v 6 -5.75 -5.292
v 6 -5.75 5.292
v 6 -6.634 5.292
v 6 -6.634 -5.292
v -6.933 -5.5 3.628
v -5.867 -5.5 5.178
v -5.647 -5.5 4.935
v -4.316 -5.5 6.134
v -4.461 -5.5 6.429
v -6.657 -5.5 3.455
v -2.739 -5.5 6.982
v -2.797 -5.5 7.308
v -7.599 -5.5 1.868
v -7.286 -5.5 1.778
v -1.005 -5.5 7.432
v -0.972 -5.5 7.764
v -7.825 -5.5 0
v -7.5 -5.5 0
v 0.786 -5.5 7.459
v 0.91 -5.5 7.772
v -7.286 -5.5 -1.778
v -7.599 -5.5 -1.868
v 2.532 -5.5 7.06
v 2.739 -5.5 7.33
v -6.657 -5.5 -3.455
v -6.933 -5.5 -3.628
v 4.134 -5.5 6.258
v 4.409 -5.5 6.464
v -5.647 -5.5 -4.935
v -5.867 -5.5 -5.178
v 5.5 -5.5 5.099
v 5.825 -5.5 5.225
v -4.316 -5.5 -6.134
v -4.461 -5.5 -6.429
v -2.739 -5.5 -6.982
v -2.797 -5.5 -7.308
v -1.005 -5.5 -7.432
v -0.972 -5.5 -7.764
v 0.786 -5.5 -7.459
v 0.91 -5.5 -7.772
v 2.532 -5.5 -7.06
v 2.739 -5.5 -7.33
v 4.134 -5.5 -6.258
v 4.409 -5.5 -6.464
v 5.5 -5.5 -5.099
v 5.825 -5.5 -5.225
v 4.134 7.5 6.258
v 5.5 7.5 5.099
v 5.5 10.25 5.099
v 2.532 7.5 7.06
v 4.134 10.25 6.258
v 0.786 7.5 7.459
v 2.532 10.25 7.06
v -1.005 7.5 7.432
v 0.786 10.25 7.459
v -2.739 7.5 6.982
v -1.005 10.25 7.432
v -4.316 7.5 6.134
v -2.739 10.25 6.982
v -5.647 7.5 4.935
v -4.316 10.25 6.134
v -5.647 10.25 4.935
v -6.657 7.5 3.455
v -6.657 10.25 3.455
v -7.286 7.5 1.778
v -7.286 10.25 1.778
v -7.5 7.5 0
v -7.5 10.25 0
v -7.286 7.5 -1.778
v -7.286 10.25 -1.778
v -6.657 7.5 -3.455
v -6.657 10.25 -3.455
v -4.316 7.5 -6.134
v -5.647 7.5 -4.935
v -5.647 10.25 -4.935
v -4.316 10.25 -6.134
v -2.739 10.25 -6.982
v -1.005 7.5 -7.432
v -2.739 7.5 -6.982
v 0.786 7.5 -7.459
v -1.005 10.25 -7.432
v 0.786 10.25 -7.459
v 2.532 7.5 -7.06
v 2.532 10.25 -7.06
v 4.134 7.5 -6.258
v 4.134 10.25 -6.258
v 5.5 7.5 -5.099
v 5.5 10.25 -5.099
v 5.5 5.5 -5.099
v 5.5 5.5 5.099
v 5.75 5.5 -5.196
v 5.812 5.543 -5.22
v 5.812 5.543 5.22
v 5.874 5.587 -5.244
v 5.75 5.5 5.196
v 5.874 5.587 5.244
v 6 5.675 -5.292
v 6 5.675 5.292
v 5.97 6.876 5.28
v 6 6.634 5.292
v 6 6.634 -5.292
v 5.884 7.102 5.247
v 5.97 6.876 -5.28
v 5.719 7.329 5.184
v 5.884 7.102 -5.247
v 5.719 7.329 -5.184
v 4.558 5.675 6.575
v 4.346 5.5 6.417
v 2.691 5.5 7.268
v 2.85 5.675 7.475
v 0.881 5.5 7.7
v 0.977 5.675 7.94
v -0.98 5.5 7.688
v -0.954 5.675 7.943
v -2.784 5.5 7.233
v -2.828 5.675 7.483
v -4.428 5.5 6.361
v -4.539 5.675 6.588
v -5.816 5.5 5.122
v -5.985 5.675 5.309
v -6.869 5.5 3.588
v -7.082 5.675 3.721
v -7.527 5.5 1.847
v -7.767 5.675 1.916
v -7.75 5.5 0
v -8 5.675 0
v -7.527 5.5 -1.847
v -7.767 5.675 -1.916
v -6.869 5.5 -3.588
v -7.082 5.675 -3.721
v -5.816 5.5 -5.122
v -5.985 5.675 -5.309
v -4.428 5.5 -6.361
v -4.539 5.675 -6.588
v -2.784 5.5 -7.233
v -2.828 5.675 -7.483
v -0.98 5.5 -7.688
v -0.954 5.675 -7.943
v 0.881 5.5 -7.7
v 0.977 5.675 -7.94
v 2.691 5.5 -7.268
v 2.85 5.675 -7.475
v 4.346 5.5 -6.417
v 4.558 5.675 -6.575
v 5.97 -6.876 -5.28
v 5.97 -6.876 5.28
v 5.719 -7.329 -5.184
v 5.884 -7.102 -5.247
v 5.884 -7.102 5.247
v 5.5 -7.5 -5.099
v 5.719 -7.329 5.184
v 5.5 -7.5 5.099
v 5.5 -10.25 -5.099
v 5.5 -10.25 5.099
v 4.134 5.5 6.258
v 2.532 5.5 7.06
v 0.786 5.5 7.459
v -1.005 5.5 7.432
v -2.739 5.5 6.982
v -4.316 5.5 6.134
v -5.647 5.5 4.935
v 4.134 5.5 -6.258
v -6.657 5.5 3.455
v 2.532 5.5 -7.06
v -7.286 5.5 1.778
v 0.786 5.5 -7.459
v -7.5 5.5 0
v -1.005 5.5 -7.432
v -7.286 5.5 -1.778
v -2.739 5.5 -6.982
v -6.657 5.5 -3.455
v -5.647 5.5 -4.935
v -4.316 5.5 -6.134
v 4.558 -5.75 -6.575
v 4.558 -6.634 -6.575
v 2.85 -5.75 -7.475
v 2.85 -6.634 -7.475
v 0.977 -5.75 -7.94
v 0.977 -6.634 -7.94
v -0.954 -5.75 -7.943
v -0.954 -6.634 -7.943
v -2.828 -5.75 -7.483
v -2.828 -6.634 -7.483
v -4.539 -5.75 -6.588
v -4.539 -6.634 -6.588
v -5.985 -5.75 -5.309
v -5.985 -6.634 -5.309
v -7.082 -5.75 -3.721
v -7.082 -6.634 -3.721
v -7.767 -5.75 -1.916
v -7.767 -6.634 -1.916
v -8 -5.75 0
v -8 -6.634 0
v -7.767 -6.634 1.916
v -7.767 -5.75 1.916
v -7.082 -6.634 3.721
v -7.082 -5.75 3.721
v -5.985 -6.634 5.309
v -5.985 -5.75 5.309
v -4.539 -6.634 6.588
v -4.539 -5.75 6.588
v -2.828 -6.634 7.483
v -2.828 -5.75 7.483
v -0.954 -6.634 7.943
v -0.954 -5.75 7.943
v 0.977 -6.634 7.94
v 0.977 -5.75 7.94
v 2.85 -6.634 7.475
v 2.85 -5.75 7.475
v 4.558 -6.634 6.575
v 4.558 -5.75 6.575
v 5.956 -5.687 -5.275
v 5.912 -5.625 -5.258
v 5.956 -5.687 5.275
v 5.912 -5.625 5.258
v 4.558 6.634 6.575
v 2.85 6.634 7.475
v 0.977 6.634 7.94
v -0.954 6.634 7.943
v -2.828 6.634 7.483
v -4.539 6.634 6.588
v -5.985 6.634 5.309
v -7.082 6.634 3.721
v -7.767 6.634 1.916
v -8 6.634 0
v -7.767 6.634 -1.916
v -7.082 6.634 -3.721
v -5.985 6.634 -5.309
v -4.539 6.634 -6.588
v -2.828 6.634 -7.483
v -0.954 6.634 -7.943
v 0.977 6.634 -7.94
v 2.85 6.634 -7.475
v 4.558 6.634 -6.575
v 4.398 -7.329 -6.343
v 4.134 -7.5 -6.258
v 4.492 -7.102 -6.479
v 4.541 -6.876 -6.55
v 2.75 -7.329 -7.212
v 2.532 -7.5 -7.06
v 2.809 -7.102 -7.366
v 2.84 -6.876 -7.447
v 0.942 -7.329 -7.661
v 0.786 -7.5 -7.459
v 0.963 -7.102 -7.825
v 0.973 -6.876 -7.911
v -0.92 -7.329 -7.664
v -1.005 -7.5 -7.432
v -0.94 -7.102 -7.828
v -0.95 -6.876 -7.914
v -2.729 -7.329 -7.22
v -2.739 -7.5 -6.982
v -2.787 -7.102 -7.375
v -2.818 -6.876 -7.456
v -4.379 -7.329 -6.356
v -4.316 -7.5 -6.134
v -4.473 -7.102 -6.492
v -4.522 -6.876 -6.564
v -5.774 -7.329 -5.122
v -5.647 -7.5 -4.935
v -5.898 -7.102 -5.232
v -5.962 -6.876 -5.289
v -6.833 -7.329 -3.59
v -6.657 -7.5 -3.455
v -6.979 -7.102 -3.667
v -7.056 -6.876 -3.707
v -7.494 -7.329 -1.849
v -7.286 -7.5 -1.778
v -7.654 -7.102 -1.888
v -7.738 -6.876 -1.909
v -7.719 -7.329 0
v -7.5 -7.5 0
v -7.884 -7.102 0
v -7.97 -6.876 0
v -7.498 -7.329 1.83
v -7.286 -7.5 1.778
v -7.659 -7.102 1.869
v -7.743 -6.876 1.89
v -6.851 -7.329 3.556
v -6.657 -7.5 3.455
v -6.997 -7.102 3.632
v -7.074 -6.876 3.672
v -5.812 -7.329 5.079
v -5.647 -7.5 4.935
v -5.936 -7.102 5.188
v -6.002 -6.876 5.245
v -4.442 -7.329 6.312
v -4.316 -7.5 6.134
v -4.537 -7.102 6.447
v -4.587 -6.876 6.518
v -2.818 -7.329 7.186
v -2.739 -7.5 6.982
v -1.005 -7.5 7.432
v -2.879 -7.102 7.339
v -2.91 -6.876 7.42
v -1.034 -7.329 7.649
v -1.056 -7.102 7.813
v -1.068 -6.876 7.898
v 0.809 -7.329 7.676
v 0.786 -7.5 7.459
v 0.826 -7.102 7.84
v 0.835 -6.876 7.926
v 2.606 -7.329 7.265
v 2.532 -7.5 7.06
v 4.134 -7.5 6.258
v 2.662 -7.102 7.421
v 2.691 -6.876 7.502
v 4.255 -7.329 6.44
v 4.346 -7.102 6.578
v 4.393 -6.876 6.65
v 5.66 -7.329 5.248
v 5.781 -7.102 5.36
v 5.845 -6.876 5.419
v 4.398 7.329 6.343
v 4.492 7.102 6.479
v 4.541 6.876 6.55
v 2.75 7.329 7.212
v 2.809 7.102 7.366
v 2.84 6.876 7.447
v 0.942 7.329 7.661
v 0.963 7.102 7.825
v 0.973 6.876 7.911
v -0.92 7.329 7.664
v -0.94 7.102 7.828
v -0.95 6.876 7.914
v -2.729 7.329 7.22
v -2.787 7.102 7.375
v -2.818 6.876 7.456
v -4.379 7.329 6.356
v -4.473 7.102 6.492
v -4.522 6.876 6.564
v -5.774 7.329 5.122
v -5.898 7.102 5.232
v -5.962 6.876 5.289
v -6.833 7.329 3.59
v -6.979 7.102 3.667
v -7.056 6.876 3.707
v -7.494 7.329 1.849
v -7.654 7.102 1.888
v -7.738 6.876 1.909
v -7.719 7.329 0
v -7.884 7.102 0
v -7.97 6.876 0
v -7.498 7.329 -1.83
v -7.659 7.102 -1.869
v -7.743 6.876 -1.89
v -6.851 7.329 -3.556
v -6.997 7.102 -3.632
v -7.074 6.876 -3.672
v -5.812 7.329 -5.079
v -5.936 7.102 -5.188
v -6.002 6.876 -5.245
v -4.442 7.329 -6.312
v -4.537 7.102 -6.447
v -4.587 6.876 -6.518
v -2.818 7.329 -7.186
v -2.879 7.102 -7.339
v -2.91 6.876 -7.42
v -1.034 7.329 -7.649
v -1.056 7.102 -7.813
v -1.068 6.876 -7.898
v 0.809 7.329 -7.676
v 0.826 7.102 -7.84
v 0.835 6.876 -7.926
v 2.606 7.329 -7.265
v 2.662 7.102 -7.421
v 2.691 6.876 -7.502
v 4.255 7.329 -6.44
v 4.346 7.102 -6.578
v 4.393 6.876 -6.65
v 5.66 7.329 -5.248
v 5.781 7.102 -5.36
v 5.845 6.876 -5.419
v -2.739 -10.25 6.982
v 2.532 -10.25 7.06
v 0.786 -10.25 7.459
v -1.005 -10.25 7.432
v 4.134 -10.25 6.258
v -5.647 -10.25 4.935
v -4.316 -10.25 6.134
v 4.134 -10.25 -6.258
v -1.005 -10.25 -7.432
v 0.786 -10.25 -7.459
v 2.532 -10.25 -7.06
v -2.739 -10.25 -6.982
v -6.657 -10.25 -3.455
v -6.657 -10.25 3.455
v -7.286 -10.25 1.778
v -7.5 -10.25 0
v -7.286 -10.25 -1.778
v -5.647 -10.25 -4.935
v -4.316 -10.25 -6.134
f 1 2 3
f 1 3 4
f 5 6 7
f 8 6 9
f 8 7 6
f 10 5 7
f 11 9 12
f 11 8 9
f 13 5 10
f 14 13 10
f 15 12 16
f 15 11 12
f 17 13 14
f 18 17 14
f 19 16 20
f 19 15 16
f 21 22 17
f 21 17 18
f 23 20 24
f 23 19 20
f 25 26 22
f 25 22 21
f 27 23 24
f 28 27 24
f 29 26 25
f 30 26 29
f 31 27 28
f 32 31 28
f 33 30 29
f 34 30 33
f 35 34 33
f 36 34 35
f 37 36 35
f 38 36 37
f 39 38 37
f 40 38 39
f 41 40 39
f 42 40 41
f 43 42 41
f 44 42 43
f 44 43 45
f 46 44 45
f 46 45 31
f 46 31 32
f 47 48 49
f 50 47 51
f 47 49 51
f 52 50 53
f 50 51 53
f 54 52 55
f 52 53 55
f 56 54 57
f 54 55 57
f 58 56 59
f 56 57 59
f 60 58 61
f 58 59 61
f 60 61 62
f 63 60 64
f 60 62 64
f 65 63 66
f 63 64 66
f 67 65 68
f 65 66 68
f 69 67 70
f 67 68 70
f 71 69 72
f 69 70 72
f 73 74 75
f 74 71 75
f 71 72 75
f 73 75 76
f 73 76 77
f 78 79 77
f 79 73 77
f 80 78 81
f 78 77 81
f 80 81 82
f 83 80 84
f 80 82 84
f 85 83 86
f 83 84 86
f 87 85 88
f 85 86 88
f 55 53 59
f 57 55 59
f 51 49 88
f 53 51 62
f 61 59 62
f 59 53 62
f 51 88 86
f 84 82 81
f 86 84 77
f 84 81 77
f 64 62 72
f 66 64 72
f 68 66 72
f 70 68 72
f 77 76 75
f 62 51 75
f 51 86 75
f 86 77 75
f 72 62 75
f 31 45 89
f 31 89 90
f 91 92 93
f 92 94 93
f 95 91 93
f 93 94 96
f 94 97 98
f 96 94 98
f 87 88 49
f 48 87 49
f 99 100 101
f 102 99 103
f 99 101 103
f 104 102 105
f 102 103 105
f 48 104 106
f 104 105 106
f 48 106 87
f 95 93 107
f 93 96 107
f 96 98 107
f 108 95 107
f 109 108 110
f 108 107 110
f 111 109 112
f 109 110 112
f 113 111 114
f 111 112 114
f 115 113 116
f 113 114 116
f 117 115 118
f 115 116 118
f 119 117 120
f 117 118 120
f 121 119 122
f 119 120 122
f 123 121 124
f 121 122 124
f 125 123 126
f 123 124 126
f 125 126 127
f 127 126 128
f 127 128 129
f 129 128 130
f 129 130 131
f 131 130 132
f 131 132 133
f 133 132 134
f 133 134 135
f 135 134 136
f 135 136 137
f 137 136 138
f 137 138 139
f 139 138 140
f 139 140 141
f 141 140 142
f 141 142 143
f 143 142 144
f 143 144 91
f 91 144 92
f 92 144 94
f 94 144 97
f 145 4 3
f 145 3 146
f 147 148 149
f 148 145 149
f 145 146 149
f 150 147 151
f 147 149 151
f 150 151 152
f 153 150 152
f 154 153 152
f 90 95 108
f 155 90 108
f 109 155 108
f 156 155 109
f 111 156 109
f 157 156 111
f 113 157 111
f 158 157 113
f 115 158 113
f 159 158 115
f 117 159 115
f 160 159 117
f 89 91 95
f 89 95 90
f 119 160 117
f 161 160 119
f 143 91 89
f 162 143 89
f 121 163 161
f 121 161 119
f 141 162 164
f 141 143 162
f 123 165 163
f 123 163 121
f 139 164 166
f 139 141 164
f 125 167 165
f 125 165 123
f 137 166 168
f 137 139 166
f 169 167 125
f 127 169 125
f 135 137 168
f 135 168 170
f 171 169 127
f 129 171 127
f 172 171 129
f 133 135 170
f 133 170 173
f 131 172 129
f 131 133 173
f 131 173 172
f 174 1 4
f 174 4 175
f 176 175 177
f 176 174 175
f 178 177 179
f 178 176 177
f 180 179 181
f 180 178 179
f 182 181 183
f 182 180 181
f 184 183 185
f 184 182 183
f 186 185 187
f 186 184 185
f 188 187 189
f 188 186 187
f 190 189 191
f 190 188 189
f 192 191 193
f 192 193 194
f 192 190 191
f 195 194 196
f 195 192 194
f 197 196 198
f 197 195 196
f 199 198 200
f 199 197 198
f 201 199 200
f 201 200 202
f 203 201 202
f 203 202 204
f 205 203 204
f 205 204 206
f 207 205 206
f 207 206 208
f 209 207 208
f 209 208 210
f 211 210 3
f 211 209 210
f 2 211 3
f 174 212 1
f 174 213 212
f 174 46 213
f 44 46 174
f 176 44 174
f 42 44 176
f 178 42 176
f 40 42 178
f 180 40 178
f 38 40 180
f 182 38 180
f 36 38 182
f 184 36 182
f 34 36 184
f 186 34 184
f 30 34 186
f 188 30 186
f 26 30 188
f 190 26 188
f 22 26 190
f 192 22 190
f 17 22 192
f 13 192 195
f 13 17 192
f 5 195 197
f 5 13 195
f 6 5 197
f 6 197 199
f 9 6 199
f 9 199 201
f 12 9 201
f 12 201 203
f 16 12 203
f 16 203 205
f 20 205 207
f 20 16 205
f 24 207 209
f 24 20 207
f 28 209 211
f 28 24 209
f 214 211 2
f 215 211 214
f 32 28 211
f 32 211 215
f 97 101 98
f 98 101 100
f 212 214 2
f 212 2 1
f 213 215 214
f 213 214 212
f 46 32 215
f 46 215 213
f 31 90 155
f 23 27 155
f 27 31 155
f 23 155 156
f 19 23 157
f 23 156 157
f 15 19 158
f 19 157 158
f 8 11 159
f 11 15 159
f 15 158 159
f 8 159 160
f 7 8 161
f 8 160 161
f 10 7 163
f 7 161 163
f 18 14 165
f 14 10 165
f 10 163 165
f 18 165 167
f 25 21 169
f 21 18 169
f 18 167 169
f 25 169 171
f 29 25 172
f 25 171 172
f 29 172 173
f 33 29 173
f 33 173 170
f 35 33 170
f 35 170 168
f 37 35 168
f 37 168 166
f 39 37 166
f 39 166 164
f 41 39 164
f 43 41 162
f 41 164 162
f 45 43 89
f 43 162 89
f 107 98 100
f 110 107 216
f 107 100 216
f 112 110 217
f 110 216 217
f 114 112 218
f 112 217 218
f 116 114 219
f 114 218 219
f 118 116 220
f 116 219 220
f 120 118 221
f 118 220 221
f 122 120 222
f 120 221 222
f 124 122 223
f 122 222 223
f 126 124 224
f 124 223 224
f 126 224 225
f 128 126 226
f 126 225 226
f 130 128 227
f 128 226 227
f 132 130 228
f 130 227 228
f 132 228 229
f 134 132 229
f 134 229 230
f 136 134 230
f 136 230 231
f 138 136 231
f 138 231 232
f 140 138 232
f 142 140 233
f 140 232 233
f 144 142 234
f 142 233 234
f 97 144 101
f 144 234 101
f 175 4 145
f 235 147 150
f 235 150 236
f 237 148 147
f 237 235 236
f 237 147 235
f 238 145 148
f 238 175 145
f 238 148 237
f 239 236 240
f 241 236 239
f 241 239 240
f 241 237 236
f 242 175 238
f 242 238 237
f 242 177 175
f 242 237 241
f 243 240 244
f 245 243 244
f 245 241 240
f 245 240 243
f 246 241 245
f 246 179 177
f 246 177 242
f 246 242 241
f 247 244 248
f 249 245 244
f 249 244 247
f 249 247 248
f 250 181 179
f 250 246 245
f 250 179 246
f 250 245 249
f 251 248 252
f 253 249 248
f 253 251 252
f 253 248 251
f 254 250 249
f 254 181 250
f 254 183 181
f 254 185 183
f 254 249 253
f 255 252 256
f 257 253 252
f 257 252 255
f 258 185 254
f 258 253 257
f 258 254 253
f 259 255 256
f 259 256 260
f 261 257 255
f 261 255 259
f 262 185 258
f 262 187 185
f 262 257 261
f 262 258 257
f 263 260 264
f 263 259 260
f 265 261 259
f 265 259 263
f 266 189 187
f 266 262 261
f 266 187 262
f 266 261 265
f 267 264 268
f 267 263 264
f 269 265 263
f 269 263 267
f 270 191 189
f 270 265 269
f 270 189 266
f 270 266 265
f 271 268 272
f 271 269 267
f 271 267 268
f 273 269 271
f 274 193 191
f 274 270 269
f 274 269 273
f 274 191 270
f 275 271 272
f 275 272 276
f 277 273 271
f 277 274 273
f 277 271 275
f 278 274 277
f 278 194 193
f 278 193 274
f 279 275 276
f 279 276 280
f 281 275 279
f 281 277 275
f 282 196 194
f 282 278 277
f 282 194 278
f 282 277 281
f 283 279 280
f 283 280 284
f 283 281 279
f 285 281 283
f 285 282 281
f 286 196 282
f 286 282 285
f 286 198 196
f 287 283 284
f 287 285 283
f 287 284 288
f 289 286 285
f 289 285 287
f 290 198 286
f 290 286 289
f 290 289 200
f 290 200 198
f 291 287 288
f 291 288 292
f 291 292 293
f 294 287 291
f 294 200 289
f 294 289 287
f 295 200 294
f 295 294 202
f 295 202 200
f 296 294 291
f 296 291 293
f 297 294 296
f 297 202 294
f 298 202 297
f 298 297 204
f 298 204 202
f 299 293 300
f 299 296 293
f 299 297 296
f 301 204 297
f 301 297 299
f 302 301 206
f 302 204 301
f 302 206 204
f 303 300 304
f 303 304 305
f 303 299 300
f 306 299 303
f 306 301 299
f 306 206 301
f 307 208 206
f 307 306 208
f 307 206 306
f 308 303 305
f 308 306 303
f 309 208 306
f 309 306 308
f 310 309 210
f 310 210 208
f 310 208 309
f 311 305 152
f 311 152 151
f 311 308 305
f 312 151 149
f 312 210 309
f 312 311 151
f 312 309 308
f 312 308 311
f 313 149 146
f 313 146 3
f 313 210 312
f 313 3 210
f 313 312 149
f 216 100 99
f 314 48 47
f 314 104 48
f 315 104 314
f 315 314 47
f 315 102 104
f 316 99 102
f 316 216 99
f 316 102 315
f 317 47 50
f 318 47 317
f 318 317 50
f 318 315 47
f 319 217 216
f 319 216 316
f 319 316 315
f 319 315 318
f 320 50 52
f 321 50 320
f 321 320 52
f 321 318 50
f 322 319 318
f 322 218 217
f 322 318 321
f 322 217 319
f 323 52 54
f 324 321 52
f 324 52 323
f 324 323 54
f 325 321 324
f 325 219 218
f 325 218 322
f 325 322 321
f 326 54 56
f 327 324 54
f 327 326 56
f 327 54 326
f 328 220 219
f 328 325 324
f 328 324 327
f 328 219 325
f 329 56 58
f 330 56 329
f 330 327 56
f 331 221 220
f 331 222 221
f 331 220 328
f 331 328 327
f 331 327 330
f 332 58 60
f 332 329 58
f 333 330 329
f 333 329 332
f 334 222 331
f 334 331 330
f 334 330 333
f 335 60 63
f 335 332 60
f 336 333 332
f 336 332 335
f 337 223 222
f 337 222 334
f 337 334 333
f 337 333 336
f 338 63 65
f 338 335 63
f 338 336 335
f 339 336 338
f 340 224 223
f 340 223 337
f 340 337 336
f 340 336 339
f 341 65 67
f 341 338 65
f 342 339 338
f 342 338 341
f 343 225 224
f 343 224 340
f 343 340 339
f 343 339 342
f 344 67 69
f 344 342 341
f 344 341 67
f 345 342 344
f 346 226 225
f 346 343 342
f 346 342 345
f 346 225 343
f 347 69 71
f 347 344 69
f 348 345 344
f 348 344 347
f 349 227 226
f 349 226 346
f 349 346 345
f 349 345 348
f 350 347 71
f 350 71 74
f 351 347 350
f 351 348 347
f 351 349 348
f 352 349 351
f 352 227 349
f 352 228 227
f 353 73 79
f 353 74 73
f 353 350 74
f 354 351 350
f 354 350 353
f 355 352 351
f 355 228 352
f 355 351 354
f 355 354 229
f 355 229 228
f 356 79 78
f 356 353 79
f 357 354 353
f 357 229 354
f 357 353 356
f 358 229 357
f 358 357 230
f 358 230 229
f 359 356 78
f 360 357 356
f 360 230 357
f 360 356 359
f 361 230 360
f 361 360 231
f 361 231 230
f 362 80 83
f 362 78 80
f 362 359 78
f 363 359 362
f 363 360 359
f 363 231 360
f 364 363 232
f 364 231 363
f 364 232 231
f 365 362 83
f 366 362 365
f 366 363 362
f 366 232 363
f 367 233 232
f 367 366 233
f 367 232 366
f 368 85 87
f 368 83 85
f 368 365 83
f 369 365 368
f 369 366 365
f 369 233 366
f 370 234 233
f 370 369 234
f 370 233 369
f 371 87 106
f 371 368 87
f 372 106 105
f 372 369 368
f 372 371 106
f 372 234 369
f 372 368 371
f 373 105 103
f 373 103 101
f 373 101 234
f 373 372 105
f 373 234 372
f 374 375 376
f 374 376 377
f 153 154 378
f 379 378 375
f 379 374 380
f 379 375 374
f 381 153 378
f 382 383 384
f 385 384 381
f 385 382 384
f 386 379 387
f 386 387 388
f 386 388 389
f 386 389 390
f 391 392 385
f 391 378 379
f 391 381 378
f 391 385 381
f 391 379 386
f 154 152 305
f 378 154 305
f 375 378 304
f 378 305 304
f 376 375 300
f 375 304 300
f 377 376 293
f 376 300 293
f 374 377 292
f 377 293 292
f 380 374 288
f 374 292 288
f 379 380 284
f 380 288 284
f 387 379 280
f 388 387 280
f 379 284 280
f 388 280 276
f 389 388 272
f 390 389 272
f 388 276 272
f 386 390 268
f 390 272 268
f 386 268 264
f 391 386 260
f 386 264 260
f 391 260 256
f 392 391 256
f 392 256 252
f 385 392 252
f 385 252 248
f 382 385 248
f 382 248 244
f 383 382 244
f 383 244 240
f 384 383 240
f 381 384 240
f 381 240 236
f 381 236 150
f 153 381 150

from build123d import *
from OCP.BRepFilletAPI import BRepFilletAPI_MakeChamfer

# Parameters (mm, degrees)
BOSS_EXTRUDE1_DEPTH = 10.25
BOSS_EXTRUDE2_DEPTH = 1
BOSS_EXTRUDE3_DEPTH = 1
FILLET1_R           = 1
CHAMFER1_SIZE       = 0.25
CHAMFER1_SIZE2      = 0.175051885


with BuildPart() as part:
    # Sketch1 → Boss-Extrude1 (new, symmetric)
    with BuildSketch(Plane(origin=(0, 0, 0), x_dir=(1, 0, 0), z_dir=(0, 1, 0))):
        with BuildLine():
            Line((5.5, 5.099019514), (5.5, -5.099019514))
            ThreePointArc((5.5, -5.099019514), (-7.5, 0), (5.5, 5.099019514))
        make_face()
    extrude(amount=BOSS_EXTRUDE1_DEPTH, both=True)

    # Sketch2 → Boss-Extrude2 (add, symmetric)
    with BuildSketch(Plane(origin=(0, 6.5, 0), x_dir=(1, 0, 0), z_dir=(0, 1, 0))):
        with BuildLine():
            Line((6, 5.291502622), (6, -5.291502622))
            ThreePointArc((6, -5.291502622), (-8, 0), (6, 5.291502622))
        make_face()
    extrude(amount=BOSS_EXTRUDE2_DEPTH, both=True)

    # Sketch3 → Boss-Extrude3 (add, symmetric)
    with BuildSketch(Plane(origin=(0, -6.5, 0), x_dir=(1, 0, 0), z_dir=(0, 1, 0))):
        with BuildLine():
            Line((6, -5.291502622), (6, 5.291502622))
            ThreePointArc((6, 5.291502622), (-8, 0), (6, -5.291502622))
        make_face()
    extrude(amount=BOSS_EXTRUDE3_DEPTH, both=True)

    # Fillet1
    # the kernel refuses this fillet: 1 mm, written as the material it takes off along each edge
    with BuildSketch(Plane(origin=(0, 7.5, 0), x_dir=(0.8999821902414007, 0, 0.43592666498883875), z_dir=(0.43592666498883875, 0, -0.8999821902414007))) as fillet1_piece_1:
        with BuildLine():
            CenterArc((7, 0.866025404), FILLET1_R, 300, 60)
            Line((7.5, 0), (7.51, -0.017320508))
            ThreePointArc((7.51, -0.017320508), (7.75, -0.02), (8, -0.02))
            Line((8, -0.02), (8.02, 0))
            Line((8.02, 0), (8.02, 0.866025404))
            Line((8.02, 0.866025404), (8, 0.866025404))
        make_face()
    revolve(axis=Axis((0, 7.5, 0), (0, -1, 0)), revolution_arc=308.311452645, mode=Mode.SUBTRACT)
    with BuildSketch(Plane(origin=(6, 7.5, -7.456566132), x_dir=(0, -1, 0), z_dir=(0, 0, 1))) as fillet1_piece_2:
        with BuildLine():
            CenterArc((0.866025404, -1), FILLET1_R, 90, 60)
            Line((0, -0.5), (-0.017320508, -0.49))
            ThreePointArc((-0.017320508, -0.49), (-0.02, -0.25), (-0.02, 0))
            Line((-0.02, 0), (0, 0.02))
            Line((0, 0.02), (0.866025404, 0.02))
            Line((0.866025404, 0.02), (0.866025404, 0))
        make_face()
    extrude(amount=14.913132263, mode=Mode.SUBTRACT)
    with BuildSketch(Plane(origin=(6, -7.5, 7.456566132), x_dir=(-1, 0, 0), z_dir=(0, 0, -1))) as fillet1_piece_3:
        with BuildLine():
            CenterArc((1, 0.866025404), FILLET1_R, 180, 60)
            Line((0, 0.866025404), (-0.02, 0.866025404))
            Line((-0.02, 0.866025404), (-0.02, 0))
            Line((-0.02, 0), (0, -0.02))
            ThreePointArc((0, -0.02), (0.25, -0.02), (0.49, -0.017320508))
            Line((0.49, -0.017320508), (0.5, 0))
        make_face()
    extrude(amount=14.913132263, mode=Mode.SUBTRACT)
    with BuildSketch(Plane(origin=(0, -7.5, 0), x_dir=(0.8999821902414012, 0, -0.4359266649888379), z_dir=(0.4359266649888379, 0, 0.8999821902414012))) as fillet1_piece_4:
        with BuildLine():
            CenterArc((7, 0.866025404), FILLET1_R, 300, 60)
            Line((8, 0.866025404), (8.02, 0.866025404))
            Line((8.02, 0.866025404), (8.02, 0))
            Line((8.02, 0), (8, -0.02))
            ThreePointArc((8, -0.02), (7.75, -0.02), (7.51, -0.017320508))
            Line((7.51, -0.017320508), (7.5, 0))
        make_face()
    revolve(axis=Axis((0, -7.5, 0), (0, 1, 0)), revolution_arc=308.311452645, mode=Mode.SUBTRACT)

    # Chamfer1: one chamfer whose edges measure the first distance from different faces: ONE call of the kernel's chamfer builder (chamfer() names one face for all edges)
    chamfer1_edges_1 = [part.edges().sort_by_distance(p)[0] for p in [
        (-8, 5.5, 0),
        (6, 5.5, 0),
    ]]
    chamfer1_side_1 = [part.faces().sort_by_distance(p)[0] for p in [
        (5.787397084, 5.5, 0),
    ]]
    chamfer1_edges_2 = [part.edges().sort_by_distance(p)[0] for p in [
        (6, -5.5, 0),
    ]]
    chamfer1_side_2 = [part.faces().sort_by_distance(p)[0] for p in [
        (6, -6.066987298, 0),
    ]]
    chamfer1_edges_3 = [part.edges().sort_by_distance(p)[0] for p in [
        (-8, -5.5, 0),
    ]]
    chamfer1_side_3 = [part.faces().sort_by_distance(p)[0] for p in [
        (-8, -6.066987298, 0),
    ]]
    chamfer1 = BRepFilletAPI_MakeChamfer(part.part.solid().wrapped)
    for e in chamfer1_edges_1:
        chamfer1.Add(CHAMFER1_SIZE, CHAMFER1_SIZE2, e.wrapped, chamfer1_side_1[0].wrapped)  # the first distance lies on this face
    for e in chamfer1_edges_2:
        chamfer1.Add(CHAMFER1_SIZE, CHAMFER1_SIZE2, e.wrapped, chamfer1_side_2[0].wrapped)  # the first distance lies on this face
    for e in chamfer1_edges_3:
        chamfer1.Add(CHAMFER1_SIZE, CHAMFER1_SIZE2, e.wrapped, chamfer1_side_3[0].wrapped)  # the first distance lies on this face
    add(Compound.cast(chamfer1.Shape()), mode=Mode.REPLACE)


solid = part.part
